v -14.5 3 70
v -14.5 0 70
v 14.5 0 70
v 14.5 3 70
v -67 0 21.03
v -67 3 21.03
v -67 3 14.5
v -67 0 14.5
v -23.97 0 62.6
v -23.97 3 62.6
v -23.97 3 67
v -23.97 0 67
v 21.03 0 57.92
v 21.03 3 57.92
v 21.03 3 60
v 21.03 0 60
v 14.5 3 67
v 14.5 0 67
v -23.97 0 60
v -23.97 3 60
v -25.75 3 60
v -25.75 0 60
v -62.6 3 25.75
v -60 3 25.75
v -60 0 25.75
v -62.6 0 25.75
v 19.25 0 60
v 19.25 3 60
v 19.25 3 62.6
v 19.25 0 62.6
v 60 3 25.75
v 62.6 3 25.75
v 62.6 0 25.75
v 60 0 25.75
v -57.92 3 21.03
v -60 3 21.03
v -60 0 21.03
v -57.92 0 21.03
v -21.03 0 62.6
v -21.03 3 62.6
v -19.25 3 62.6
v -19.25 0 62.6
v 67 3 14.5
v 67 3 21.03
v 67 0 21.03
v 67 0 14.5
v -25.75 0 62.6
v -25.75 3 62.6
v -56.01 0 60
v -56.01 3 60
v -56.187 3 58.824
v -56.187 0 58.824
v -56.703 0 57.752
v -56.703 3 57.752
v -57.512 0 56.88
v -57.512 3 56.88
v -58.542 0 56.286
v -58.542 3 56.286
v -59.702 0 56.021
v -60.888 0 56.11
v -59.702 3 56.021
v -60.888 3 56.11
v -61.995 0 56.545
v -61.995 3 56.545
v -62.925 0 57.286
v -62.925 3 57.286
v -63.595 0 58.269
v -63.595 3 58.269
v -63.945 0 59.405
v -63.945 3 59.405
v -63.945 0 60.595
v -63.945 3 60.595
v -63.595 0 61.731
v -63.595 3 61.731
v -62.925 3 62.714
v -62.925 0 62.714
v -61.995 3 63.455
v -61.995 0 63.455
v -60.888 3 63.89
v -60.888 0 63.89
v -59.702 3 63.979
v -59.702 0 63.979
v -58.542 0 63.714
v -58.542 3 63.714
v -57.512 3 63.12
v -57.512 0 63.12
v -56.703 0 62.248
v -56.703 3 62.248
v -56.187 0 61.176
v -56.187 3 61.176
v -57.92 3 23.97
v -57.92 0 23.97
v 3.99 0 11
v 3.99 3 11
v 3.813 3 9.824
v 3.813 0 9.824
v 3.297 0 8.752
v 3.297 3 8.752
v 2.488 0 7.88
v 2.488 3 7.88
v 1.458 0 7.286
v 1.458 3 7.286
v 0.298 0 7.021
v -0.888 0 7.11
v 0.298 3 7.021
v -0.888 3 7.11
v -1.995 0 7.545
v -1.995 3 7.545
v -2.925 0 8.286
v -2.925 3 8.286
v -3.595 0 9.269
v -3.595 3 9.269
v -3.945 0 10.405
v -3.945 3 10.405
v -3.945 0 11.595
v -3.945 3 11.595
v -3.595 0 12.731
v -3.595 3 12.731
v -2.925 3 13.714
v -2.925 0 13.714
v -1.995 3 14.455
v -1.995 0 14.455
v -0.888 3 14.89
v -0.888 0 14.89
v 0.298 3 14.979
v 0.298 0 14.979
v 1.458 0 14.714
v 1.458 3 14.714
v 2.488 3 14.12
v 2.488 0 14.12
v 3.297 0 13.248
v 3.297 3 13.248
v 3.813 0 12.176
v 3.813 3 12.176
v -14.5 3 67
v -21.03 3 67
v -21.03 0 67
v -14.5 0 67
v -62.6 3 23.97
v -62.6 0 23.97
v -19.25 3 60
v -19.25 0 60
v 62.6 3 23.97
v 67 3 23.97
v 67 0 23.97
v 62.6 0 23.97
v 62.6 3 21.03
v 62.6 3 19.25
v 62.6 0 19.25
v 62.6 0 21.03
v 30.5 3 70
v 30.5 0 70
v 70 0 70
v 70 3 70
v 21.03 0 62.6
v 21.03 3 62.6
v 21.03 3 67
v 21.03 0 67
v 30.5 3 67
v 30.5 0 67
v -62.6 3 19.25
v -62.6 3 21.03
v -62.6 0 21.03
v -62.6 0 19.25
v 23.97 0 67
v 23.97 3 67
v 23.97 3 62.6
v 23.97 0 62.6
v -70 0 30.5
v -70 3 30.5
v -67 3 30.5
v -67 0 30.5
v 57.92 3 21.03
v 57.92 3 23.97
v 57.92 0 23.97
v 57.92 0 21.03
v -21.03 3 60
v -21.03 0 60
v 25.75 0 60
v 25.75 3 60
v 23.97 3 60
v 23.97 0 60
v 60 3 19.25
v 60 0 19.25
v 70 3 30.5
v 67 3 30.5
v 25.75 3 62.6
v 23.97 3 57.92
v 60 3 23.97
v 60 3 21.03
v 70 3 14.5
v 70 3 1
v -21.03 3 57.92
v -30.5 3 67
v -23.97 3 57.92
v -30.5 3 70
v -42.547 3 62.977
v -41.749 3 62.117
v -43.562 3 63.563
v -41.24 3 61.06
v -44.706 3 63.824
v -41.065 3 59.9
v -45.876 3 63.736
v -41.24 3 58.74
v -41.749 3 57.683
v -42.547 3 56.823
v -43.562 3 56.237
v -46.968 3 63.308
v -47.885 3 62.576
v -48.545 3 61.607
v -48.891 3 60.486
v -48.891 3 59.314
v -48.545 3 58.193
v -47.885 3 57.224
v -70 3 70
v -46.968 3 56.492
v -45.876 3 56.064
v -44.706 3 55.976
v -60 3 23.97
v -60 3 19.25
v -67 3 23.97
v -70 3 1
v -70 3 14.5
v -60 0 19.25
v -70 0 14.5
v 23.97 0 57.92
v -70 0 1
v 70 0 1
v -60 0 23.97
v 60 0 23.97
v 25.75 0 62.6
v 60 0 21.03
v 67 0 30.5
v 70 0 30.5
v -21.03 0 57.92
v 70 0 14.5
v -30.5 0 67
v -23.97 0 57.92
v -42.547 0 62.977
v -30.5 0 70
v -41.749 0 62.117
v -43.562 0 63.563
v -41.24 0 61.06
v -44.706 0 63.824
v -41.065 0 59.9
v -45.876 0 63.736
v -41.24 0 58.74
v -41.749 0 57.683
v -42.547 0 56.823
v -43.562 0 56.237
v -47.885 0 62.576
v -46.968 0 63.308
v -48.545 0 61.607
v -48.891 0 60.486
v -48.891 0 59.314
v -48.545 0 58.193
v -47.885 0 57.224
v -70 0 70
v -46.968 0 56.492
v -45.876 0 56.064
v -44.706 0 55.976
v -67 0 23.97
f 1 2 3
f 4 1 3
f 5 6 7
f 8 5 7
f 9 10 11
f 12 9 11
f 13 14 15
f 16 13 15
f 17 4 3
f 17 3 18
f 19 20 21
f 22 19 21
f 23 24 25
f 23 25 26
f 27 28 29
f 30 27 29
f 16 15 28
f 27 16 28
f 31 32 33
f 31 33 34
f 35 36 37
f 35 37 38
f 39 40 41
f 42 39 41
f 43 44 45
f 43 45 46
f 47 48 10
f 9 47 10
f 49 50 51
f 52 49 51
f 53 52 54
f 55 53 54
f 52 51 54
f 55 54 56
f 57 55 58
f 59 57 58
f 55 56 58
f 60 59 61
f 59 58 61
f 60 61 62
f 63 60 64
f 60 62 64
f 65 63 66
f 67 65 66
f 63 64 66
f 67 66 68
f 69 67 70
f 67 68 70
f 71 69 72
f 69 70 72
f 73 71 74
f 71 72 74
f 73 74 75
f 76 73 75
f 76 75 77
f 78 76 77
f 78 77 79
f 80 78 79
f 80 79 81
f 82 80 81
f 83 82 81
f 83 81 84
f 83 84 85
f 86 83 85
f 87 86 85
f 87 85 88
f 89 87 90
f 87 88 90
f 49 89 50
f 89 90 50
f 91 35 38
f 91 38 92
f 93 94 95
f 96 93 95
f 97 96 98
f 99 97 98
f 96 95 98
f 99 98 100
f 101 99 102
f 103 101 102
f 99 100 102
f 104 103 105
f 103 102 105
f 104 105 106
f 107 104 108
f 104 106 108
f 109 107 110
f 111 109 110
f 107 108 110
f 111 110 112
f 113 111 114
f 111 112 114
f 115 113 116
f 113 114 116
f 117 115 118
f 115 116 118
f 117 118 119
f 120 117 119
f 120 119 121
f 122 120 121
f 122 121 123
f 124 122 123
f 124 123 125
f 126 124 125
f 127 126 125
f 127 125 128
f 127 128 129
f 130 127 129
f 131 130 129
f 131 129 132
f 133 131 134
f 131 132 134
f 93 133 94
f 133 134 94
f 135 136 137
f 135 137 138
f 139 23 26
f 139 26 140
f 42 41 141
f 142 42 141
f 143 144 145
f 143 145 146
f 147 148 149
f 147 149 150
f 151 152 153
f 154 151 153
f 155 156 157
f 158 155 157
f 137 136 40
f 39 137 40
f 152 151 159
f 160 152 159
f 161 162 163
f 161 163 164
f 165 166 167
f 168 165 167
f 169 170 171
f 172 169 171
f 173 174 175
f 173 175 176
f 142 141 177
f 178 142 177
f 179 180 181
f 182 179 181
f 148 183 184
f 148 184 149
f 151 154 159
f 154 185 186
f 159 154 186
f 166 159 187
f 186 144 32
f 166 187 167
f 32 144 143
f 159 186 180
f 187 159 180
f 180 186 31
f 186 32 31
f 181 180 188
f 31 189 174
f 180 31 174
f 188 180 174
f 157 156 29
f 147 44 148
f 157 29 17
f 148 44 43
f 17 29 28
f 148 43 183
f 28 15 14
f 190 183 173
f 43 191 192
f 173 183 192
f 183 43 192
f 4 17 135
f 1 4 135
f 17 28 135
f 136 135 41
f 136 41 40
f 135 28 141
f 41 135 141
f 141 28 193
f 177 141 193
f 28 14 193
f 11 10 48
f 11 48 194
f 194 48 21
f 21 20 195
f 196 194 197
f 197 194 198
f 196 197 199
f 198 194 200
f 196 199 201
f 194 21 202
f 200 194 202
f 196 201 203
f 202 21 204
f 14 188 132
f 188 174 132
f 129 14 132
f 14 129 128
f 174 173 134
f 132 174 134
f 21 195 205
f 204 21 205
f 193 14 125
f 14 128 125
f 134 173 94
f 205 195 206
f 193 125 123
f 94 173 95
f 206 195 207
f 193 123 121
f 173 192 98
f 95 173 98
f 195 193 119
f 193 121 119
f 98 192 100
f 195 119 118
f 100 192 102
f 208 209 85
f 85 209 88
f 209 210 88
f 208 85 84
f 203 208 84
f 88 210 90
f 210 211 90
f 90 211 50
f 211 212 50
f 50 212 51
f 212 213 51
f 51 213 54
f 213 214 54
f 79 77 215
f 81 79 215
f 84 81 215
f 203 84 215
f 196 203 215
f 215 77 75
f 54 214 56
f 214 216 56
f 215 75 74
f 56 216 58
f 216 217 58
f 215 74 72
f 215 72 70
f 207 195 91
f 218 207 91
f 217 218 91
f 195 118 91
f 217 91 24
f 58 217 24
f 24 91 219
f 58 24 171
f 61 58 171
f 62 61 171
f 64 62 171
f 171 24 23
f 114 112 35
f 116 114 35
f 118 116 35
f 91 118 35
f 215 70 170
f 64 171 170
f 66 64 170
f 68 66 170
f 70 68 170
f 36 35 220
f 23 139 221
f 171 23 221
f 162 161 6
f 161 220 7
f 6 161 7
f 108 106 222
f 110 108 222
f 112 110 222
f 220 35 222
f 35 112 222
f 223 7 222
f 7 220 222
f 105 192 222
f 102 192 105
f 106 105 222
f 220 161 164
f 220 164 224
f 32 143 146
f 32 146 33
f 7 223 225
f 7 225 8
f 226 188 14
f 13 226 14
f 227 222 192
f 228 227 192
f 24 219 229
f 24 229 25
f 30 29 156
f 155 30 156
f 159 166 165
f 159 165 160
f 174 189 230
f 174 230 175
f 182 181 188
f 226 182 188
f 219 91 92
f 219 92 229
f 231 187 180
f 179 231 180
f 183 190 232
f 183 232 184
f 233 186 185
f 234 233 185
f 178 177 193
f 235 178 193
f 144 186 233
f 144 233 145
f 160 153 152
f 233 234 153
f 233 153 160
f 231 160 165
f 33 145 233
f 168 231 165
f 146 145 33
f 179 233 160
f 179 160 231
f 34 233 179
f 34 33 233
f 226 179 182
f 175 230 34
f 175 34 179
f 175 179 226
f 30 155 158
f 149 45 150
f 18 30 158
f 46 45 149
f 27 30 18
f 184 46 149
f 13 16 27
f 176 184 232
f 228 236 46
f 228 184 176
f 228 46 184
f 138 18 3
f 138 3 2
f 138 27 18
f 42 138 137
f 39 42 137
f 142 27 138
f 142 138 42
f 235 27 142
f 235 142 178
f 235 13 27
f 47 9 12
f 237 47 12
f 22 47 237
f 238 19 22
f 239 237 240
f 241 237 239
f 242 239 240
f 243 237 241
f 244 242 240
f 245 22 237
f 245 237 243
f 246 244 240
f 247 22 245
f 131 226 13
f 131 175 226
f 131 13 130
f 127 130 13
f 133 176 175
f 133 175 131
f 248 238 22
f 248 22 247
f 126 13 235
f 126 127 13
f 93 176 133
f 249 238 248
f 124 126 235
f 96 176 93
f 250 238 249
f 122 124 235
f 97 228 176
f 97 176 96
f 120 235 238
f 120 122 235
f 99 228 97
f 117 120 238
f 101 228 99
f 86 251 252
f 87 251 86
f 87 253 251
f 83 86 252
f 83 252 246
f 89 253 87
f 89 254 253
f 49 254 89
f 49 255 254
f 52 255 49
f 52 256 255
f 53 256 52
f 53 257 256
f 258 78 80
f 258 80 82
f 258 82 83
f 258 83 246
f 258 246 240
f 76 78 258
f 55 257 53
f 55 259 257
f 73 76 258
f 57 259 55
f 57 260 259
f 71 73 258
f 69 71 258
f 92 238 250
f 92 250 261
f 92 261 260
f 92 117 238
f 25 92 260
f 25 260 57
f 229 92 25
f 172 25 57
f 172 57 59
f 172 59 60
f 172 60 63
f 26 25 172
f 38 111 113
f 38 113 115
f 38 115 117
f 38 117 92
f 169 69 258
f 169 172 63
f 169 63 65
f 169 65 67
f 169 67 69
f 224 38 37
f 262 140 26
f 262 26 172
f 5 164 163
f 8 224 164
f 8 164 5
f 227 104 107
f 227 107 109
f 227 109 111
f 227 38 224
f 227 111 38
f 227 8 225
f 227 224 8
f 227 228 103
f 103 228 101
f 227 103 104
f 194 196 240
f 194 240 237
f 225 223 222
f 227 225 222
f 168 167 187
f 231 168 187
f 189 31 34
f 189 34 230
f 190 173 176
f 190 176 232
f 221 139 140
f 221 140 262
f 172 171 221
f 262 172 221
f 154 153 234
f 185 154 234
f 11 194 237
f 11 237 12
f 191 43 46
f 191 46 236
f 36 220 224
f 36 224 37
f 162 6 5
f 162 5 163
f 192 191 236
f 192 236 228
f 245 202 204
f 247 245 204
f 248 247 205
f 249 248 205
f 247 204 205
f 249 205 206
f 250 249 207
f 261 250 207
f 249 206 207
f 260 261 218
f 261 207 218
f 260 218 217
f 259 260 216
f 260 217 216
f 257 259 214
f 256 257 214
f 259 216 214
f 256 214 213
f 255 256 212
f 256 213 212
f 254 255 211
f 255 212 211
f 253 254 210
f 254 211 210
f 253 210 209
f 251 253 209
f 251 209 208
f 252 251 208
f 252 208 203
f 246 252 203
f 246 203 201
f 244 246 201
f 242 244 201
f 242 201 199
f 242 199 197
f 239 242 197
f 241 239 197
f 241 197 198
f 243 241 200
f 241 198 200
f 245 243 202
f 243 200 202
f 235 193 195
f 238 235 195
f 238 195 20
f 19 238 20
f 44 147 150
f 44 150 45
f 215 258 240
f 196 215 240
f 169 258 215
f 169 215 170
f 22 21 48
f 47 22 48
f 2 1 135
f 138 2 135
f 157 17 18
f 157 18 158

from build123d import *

# Parameters (mm, degrees)
SKETCH1_W           = 140
SKETCH1_H           = 140
BOSS_EXTRUDE1_DEPTH = 3
SKETCH2_W           = 16
SKETCH2_H           = 3
SKETCH2_W_2         = 3
SKETCH2_H_2         = 16
CUT_EXTRUDE1_DEPTH  = 3
SKETCH3_W           = 3
SKETCH3_H           = 10
CUT_EXTRUDE2_DEPTH  = 10
SKETCH4_W           = 3
SKETCH4_H           = 10
CUT_EXTRUDE3_DEPTH  = 3
CUT_EXTRUDE4_DEPTH  = 3
CUT_EXTRUDE5_DEPTH  = 3
BOSS_EXTRUDE4_DEPTH = 3
BOSS_EXTRUDE5_DEPTH = 3
SKETCH12_W          = 3
SKETCH12_H          = 3
BOSS_EXTRUDE6_DEPTH = 3
SKETCH13_W          = 3
SKETCH13_H          = 3
BOSS_EXTRUDE7_DEPTH = 3
BOSS_EXTRUDE8_DEPTH = 3
SKETCH15_W          = 140
SKETCH15_H          = 1
CUT_EXTRUDE6_DEPTH  = 3
SKETCH16_W          = 140
SKETCH16_H          = 70
CUT_EXTRUDE8_DEPTH  = 3
SKETCH17_R          = 3.99
CUT_EXTRUDE11_DEPTH = 3
SKETCH18_R          = 3.935
CUT_EXTRUDE12_DEPTH = 3


with BuildPart() as part:
    # Sketch1 → Boss-Extrude1 (new body)
    with BuildSketch(Plane(origin=(0, 0, 0), x_dir=(1, 0, 0), z_dir=(0, 1, 0))):
        Rectangle(SKETCH1_W, SKETCH1_H)
    extrude(amount=BOSS_EXTRUDE1_DEPTH)

    # Sketch2 → Cut-Extrude1 (cut)
    with BuildSketch(Plane(origin=(0, 3, 0), x_dir=(1, 0, 0), z_dir=(0, 1, 0))):
        with Locations((-22.5, 68.5)):
            Rectangle(SKETCH2_W, SKETCH2_H)
        with Locations((-22.5, -68.5)):
            Rectangle(SKETCH2_W, SKETCH2_H)
        with Locations((22.5, -68.5)):
            Rectangle(SKETCH2_W, SKETCH2_H)
        with Locations((22.5, 68.5)):
            Rectangle(SKETCH2_W, SKETCH2_H)
        with Locations((-68.5, 22.5)):
            Rectangle(SKETCH2_W_2, SKETCH2_H_2)
        with Locations((-68.5, -22.5)):
            Rectangle(SKETCH2_W_2, SKETCH2_H_2)
        with Locations((68.5, -22.5)):
            Rectangle(SKETCH2_W_2, SKETCH2_H_2)
        with Locations((68.5, 22.5)):
            Rectangle(SKETCH2_W_2, SKETCH2_H_2)
    extrude(amount=-CUT_EXTRUDE1_DEPTH, mode=Mode.SUBTRACT)

    # Sketch3 → Cut-Extrude2 (cut)
    with BuildSketch(Plane(origin=(0, 3, 0), x_dir=(1, 0, 0), z_dir=(0, 1, 0))):
        with Locations((-68.5, 65)):
            Rectangle(SKETCH3_W, SKETCH3_H)
    extrude(amount=-CUT_EXTRUDE2_DEPTH, mode=Mode.SUBTRACT)

    # Sketch4 → Cut-Extrude3 (cut)
    with BuildSketch(Plane(origin=(0, 3, 0), x_dir=(1, 0, 0), z_dir=(0, 1, 0))):
        with Locations((68.5, 65)):
            Rectangle(SKETCH4_W, SKETCH4_H)
    extrude(amount=-CUT_EXTRUDE3_DEPTH, mode=Mode.SUBTRACT)

    # Sketch5 → Cut-Extrude4 (cut)
    with BuildSketch(Plane(origin=(0, 3, 0), x_dir=(1, 0, 0), z_dir=(0, 1, 0))):
        Polygon((-21.03, 67), (-23.97, 67), (-23.97, 62.6), (-25.75, 62.6), (-25.75, 60), (-23.97, 60), (-23.97, 57.92), (-21.03, 57.92), (-21.03, 60), (-19.25, 60), (-19.25, 62.6), (-21.03, 62.6), align=None)
        Polygon((-21.03, -67), (-21.03, -62.6), (-19.25, -62.6), (-19.25, -60), (-21.03, -60), (-21.03, -57.92), (-23.97, -57.92), (-23.97, -60), (-25.75, -60), (-25.75, -62.6), (-23.97, -62.6), (-23.97, -67), align=None)
        Polygon((21.03, 67), (21.03, 62.6), (19.25, 62.6), (19.25, 60), (21.03, 60), (21.03, 57.92), (23.97, 57.92), (23.97, 60), (25.75, 60), (25.75, 62.6), (23.97, 62.6), (23.97, 67), align=None)
        Polygon((21.03, -67), (23.97, -67), (23.97, -62.6), (25.75, -62.6), (25.75, -60), (23.97, -60), (23.97, -57.92), (21.03, -57.92), (21.03, -60), (19.25, -60), (19.25, -62.6), (21.03, -62.6), align=None)
    extrude(amount=-CUT_EXTRUDE4_DEPTH, mode=Mode.SUBTRACT)

    # Sketch6 → Cut-Extrude5 (cut)
    with BuildSketch(Plane(origin=(0, 3, 0), x_dir=(1, 0, 0), z_dir=(0, 1, 0))):
        Polygon((67, -21.03), (67, -23.97), (62.6, -23.97), (62.6, -25.75), (60, -25.75), (60, -23.97), (57.92, -23.97), (57.92, -21.03), (60, -21.03), (60, -19.25), (62.6, -19.25), (62.6, -21.03), align=None)
        Polygon((67, 21.03), (62.6, 21.03), (62.6, 19.25), (60, 19.25), (60, 21.03), (57.92, 21.03), (57.92, 23.97), (60, 23.97), (60, 25.75), (62.6, 25.75), (62.6, 23.97), (67, 23.97), align=None)
        Polygon((-67, -21.03), (-62.6, -21.03), (-62.6, -19.25), (-60, -19.25), (-60, -21.03), (-57.92, -21.03), (-57.92, -23.97), (-60, -23.97), (-60, -25.75), (-62.6, -25.75), (-62.6, -23.97), (-67, -23.97), align=None)
        Polygon((-67, 21.03), (-67, 23.97), (-62.6, 23.97), (-62.6, 25.75), (-60, 25.75), (-60, 23.97), (-57.92, 23.97), (-57.92, 21.03), (-60, 21.03), (-60, 19.25), (-62.6, 19.25), (-62.6, 21.03), align=None)
    extrude(amount=-CUT_EXTRUDE5_DEPTH, mode=Mode.SUBTRACT)

    # Sketch8 → Boss-Extrude4 (add)
    with BuildSketch(Plane(origin=(0, 3, 0), x_dir=(1, 0, 0), z_dir=(0, 1, 0))):
        Polygon((-70, 30.5), (-67, 30.5), (-67, 23.97), (-62.6, 23.97), (-62.6, 25.75), (-60, 25.75), (-60, 23.97), (-57.92, 23.97), (-57.92, 21.03), (-60, 21.03), (-60, 19.25), (-62.6, 19.25), (-62.6, 21.03), (-67, 21.03), (-67, 14.5), (-70, 14.5), align=None)
    extrude(amount=-BOSS_EXTRUDE4_DEPTH)

    # Sketch10 → Boss-Extrude5 (add)
    with BuildSketch(Plane(origin=(0, 3, 0), x_dir=(1, 0, 0), z_dir=(0, 1, 0))):
        Polygon((70, 30.5), (67, 30.5), (67, 23.97), (62.6, 23.97), (62.6, 25.75), (60, 25.75), (60, 23.97), (57.92, 23.97), (57.92, 21.03), (60, 21.03), (60, 19.25), (62.6, 19.25), (62.6, 21.03), (67, 21.03), (67, 14.5), (70, 14.5), align=None)
    extrude(amount=-BOSS_EXTRUDE5_DEPTH)

    # Sketch12 → Boss-Extrude6 (add)
    with BuildSketch(Plane(origin=(0, 3, 0), x_dir=(1, 0, 0), z_dir=(0, 1, 0))):
        with Locations((-68.5, 68.5)):
            Rectangle(SKETCH12_W, SKETCH12_H)
    extrude(amount=-BOSS_EXTRUDE6_DEPTH)

    # Sketch13 → Boss-Extrude7 (add)
    with BuildSketch(Plane(origin=(0, 3, 0), x_dir=(1, 0, 0), z_dir=(0, 1, 0))):
        with Locations((68.5, 68.5)):
            Rectangle(SKETCH13_W, SKETCH13_H)
    extrude(amount=-BOSS_EXTRUDE7_DEPTH)

    # Sketch14 → Boss-Extrude8 (add)
    with BuildSketch(Plane(origin=(0, 3, 0), x_dir=(1, 0, 0), z_dir=(0, 1, 0))):
        Polygon((-30.5, 70), (-14.5, 70), (-14.5, 67), (-21.03, 67), (-21.03, 62.6), (-19.25, 62.6), (-19.25, 60), (-21.03, 60), (-21.03, 57.92), (-23.97, 57.92), (-23.97, 60), (-25.75, 60), (-25.75, 62.6), (-23.97, 62.6), (-23.97, 67), (-30.5, 67), align=None)
        Polygon((14.5, 70), (30.5, 70), (30.5, 67), (23.97, 67), (23.97, 62.6), (25.75, 62.6), (25.75, 60), (23.97, 60), (23.97, 57.92), (21.03, 57.92), (21.03, 60), (19.25, 60), (19.25, 62.6), (21.03, 62.6), (21.03, 67), (14.5, 67), align=None)
    extrude(amount=-BOSS_EXTRUDE8_DEPTH)

    # Sketch15 → Cut-Extrude6 (cut)
    with BuildSketch(Plane(origin=(0, 3, 0), x_dir=(1, 0, 0), z_dir=(0, 1, 0))):
        with Locations((0, -0.5)):
            Rectangle(SKETCH15_W, SKETCH15_H)
    extrude(amount=-CUT_EXTRUDE6_DEPTH, mode=Mode.SUBTRACT)

    # Sketch16 → Cut-Extrude8 (cut)
    with BuildSketch(Plane(origin=(0, 3, 0), x_dir=(1, 0, 0), z_dir=(0, 1, 0))):
        with Locations((0, 35)):
            Rectangle(SKETCH16_W, SKETCH16_H)
    extrude(amount=-CUT_EXTRUDE8_DEPTH, mode=Mode.SUBTRACT)

    # Sketch17 → Cut-Extrude11 (cut)
    with BuildSketch(Plane(origin=(0, 3, 0), x_dir=(1, 0, 0), z_dir=(0, 1, 0))):
        with Locations((0, -11)):
            Circle(SKETCH17_R)
        with Locations((-60, -60)):
            Circle(SKETCH17_R)
    extrude(amount=-CUT_EXTRUDE11_DEPTH, mode=Mode.SUBTRACT)

    # Sketch18 → Cut-Extrude12 (cut)
    with BuildSketch(Plane(origin=(0, 3, 0), x_dir=(1, 0, 0), z_dir=(0, 1, 0))):
        with Locations((-45, -59.9)):
            Circle(SKETCH18_R)
    extrude(amount=-CUT_EXTRUDE12_DEPTH, mode=Mode.SUBTRACT)


solid = part.part
